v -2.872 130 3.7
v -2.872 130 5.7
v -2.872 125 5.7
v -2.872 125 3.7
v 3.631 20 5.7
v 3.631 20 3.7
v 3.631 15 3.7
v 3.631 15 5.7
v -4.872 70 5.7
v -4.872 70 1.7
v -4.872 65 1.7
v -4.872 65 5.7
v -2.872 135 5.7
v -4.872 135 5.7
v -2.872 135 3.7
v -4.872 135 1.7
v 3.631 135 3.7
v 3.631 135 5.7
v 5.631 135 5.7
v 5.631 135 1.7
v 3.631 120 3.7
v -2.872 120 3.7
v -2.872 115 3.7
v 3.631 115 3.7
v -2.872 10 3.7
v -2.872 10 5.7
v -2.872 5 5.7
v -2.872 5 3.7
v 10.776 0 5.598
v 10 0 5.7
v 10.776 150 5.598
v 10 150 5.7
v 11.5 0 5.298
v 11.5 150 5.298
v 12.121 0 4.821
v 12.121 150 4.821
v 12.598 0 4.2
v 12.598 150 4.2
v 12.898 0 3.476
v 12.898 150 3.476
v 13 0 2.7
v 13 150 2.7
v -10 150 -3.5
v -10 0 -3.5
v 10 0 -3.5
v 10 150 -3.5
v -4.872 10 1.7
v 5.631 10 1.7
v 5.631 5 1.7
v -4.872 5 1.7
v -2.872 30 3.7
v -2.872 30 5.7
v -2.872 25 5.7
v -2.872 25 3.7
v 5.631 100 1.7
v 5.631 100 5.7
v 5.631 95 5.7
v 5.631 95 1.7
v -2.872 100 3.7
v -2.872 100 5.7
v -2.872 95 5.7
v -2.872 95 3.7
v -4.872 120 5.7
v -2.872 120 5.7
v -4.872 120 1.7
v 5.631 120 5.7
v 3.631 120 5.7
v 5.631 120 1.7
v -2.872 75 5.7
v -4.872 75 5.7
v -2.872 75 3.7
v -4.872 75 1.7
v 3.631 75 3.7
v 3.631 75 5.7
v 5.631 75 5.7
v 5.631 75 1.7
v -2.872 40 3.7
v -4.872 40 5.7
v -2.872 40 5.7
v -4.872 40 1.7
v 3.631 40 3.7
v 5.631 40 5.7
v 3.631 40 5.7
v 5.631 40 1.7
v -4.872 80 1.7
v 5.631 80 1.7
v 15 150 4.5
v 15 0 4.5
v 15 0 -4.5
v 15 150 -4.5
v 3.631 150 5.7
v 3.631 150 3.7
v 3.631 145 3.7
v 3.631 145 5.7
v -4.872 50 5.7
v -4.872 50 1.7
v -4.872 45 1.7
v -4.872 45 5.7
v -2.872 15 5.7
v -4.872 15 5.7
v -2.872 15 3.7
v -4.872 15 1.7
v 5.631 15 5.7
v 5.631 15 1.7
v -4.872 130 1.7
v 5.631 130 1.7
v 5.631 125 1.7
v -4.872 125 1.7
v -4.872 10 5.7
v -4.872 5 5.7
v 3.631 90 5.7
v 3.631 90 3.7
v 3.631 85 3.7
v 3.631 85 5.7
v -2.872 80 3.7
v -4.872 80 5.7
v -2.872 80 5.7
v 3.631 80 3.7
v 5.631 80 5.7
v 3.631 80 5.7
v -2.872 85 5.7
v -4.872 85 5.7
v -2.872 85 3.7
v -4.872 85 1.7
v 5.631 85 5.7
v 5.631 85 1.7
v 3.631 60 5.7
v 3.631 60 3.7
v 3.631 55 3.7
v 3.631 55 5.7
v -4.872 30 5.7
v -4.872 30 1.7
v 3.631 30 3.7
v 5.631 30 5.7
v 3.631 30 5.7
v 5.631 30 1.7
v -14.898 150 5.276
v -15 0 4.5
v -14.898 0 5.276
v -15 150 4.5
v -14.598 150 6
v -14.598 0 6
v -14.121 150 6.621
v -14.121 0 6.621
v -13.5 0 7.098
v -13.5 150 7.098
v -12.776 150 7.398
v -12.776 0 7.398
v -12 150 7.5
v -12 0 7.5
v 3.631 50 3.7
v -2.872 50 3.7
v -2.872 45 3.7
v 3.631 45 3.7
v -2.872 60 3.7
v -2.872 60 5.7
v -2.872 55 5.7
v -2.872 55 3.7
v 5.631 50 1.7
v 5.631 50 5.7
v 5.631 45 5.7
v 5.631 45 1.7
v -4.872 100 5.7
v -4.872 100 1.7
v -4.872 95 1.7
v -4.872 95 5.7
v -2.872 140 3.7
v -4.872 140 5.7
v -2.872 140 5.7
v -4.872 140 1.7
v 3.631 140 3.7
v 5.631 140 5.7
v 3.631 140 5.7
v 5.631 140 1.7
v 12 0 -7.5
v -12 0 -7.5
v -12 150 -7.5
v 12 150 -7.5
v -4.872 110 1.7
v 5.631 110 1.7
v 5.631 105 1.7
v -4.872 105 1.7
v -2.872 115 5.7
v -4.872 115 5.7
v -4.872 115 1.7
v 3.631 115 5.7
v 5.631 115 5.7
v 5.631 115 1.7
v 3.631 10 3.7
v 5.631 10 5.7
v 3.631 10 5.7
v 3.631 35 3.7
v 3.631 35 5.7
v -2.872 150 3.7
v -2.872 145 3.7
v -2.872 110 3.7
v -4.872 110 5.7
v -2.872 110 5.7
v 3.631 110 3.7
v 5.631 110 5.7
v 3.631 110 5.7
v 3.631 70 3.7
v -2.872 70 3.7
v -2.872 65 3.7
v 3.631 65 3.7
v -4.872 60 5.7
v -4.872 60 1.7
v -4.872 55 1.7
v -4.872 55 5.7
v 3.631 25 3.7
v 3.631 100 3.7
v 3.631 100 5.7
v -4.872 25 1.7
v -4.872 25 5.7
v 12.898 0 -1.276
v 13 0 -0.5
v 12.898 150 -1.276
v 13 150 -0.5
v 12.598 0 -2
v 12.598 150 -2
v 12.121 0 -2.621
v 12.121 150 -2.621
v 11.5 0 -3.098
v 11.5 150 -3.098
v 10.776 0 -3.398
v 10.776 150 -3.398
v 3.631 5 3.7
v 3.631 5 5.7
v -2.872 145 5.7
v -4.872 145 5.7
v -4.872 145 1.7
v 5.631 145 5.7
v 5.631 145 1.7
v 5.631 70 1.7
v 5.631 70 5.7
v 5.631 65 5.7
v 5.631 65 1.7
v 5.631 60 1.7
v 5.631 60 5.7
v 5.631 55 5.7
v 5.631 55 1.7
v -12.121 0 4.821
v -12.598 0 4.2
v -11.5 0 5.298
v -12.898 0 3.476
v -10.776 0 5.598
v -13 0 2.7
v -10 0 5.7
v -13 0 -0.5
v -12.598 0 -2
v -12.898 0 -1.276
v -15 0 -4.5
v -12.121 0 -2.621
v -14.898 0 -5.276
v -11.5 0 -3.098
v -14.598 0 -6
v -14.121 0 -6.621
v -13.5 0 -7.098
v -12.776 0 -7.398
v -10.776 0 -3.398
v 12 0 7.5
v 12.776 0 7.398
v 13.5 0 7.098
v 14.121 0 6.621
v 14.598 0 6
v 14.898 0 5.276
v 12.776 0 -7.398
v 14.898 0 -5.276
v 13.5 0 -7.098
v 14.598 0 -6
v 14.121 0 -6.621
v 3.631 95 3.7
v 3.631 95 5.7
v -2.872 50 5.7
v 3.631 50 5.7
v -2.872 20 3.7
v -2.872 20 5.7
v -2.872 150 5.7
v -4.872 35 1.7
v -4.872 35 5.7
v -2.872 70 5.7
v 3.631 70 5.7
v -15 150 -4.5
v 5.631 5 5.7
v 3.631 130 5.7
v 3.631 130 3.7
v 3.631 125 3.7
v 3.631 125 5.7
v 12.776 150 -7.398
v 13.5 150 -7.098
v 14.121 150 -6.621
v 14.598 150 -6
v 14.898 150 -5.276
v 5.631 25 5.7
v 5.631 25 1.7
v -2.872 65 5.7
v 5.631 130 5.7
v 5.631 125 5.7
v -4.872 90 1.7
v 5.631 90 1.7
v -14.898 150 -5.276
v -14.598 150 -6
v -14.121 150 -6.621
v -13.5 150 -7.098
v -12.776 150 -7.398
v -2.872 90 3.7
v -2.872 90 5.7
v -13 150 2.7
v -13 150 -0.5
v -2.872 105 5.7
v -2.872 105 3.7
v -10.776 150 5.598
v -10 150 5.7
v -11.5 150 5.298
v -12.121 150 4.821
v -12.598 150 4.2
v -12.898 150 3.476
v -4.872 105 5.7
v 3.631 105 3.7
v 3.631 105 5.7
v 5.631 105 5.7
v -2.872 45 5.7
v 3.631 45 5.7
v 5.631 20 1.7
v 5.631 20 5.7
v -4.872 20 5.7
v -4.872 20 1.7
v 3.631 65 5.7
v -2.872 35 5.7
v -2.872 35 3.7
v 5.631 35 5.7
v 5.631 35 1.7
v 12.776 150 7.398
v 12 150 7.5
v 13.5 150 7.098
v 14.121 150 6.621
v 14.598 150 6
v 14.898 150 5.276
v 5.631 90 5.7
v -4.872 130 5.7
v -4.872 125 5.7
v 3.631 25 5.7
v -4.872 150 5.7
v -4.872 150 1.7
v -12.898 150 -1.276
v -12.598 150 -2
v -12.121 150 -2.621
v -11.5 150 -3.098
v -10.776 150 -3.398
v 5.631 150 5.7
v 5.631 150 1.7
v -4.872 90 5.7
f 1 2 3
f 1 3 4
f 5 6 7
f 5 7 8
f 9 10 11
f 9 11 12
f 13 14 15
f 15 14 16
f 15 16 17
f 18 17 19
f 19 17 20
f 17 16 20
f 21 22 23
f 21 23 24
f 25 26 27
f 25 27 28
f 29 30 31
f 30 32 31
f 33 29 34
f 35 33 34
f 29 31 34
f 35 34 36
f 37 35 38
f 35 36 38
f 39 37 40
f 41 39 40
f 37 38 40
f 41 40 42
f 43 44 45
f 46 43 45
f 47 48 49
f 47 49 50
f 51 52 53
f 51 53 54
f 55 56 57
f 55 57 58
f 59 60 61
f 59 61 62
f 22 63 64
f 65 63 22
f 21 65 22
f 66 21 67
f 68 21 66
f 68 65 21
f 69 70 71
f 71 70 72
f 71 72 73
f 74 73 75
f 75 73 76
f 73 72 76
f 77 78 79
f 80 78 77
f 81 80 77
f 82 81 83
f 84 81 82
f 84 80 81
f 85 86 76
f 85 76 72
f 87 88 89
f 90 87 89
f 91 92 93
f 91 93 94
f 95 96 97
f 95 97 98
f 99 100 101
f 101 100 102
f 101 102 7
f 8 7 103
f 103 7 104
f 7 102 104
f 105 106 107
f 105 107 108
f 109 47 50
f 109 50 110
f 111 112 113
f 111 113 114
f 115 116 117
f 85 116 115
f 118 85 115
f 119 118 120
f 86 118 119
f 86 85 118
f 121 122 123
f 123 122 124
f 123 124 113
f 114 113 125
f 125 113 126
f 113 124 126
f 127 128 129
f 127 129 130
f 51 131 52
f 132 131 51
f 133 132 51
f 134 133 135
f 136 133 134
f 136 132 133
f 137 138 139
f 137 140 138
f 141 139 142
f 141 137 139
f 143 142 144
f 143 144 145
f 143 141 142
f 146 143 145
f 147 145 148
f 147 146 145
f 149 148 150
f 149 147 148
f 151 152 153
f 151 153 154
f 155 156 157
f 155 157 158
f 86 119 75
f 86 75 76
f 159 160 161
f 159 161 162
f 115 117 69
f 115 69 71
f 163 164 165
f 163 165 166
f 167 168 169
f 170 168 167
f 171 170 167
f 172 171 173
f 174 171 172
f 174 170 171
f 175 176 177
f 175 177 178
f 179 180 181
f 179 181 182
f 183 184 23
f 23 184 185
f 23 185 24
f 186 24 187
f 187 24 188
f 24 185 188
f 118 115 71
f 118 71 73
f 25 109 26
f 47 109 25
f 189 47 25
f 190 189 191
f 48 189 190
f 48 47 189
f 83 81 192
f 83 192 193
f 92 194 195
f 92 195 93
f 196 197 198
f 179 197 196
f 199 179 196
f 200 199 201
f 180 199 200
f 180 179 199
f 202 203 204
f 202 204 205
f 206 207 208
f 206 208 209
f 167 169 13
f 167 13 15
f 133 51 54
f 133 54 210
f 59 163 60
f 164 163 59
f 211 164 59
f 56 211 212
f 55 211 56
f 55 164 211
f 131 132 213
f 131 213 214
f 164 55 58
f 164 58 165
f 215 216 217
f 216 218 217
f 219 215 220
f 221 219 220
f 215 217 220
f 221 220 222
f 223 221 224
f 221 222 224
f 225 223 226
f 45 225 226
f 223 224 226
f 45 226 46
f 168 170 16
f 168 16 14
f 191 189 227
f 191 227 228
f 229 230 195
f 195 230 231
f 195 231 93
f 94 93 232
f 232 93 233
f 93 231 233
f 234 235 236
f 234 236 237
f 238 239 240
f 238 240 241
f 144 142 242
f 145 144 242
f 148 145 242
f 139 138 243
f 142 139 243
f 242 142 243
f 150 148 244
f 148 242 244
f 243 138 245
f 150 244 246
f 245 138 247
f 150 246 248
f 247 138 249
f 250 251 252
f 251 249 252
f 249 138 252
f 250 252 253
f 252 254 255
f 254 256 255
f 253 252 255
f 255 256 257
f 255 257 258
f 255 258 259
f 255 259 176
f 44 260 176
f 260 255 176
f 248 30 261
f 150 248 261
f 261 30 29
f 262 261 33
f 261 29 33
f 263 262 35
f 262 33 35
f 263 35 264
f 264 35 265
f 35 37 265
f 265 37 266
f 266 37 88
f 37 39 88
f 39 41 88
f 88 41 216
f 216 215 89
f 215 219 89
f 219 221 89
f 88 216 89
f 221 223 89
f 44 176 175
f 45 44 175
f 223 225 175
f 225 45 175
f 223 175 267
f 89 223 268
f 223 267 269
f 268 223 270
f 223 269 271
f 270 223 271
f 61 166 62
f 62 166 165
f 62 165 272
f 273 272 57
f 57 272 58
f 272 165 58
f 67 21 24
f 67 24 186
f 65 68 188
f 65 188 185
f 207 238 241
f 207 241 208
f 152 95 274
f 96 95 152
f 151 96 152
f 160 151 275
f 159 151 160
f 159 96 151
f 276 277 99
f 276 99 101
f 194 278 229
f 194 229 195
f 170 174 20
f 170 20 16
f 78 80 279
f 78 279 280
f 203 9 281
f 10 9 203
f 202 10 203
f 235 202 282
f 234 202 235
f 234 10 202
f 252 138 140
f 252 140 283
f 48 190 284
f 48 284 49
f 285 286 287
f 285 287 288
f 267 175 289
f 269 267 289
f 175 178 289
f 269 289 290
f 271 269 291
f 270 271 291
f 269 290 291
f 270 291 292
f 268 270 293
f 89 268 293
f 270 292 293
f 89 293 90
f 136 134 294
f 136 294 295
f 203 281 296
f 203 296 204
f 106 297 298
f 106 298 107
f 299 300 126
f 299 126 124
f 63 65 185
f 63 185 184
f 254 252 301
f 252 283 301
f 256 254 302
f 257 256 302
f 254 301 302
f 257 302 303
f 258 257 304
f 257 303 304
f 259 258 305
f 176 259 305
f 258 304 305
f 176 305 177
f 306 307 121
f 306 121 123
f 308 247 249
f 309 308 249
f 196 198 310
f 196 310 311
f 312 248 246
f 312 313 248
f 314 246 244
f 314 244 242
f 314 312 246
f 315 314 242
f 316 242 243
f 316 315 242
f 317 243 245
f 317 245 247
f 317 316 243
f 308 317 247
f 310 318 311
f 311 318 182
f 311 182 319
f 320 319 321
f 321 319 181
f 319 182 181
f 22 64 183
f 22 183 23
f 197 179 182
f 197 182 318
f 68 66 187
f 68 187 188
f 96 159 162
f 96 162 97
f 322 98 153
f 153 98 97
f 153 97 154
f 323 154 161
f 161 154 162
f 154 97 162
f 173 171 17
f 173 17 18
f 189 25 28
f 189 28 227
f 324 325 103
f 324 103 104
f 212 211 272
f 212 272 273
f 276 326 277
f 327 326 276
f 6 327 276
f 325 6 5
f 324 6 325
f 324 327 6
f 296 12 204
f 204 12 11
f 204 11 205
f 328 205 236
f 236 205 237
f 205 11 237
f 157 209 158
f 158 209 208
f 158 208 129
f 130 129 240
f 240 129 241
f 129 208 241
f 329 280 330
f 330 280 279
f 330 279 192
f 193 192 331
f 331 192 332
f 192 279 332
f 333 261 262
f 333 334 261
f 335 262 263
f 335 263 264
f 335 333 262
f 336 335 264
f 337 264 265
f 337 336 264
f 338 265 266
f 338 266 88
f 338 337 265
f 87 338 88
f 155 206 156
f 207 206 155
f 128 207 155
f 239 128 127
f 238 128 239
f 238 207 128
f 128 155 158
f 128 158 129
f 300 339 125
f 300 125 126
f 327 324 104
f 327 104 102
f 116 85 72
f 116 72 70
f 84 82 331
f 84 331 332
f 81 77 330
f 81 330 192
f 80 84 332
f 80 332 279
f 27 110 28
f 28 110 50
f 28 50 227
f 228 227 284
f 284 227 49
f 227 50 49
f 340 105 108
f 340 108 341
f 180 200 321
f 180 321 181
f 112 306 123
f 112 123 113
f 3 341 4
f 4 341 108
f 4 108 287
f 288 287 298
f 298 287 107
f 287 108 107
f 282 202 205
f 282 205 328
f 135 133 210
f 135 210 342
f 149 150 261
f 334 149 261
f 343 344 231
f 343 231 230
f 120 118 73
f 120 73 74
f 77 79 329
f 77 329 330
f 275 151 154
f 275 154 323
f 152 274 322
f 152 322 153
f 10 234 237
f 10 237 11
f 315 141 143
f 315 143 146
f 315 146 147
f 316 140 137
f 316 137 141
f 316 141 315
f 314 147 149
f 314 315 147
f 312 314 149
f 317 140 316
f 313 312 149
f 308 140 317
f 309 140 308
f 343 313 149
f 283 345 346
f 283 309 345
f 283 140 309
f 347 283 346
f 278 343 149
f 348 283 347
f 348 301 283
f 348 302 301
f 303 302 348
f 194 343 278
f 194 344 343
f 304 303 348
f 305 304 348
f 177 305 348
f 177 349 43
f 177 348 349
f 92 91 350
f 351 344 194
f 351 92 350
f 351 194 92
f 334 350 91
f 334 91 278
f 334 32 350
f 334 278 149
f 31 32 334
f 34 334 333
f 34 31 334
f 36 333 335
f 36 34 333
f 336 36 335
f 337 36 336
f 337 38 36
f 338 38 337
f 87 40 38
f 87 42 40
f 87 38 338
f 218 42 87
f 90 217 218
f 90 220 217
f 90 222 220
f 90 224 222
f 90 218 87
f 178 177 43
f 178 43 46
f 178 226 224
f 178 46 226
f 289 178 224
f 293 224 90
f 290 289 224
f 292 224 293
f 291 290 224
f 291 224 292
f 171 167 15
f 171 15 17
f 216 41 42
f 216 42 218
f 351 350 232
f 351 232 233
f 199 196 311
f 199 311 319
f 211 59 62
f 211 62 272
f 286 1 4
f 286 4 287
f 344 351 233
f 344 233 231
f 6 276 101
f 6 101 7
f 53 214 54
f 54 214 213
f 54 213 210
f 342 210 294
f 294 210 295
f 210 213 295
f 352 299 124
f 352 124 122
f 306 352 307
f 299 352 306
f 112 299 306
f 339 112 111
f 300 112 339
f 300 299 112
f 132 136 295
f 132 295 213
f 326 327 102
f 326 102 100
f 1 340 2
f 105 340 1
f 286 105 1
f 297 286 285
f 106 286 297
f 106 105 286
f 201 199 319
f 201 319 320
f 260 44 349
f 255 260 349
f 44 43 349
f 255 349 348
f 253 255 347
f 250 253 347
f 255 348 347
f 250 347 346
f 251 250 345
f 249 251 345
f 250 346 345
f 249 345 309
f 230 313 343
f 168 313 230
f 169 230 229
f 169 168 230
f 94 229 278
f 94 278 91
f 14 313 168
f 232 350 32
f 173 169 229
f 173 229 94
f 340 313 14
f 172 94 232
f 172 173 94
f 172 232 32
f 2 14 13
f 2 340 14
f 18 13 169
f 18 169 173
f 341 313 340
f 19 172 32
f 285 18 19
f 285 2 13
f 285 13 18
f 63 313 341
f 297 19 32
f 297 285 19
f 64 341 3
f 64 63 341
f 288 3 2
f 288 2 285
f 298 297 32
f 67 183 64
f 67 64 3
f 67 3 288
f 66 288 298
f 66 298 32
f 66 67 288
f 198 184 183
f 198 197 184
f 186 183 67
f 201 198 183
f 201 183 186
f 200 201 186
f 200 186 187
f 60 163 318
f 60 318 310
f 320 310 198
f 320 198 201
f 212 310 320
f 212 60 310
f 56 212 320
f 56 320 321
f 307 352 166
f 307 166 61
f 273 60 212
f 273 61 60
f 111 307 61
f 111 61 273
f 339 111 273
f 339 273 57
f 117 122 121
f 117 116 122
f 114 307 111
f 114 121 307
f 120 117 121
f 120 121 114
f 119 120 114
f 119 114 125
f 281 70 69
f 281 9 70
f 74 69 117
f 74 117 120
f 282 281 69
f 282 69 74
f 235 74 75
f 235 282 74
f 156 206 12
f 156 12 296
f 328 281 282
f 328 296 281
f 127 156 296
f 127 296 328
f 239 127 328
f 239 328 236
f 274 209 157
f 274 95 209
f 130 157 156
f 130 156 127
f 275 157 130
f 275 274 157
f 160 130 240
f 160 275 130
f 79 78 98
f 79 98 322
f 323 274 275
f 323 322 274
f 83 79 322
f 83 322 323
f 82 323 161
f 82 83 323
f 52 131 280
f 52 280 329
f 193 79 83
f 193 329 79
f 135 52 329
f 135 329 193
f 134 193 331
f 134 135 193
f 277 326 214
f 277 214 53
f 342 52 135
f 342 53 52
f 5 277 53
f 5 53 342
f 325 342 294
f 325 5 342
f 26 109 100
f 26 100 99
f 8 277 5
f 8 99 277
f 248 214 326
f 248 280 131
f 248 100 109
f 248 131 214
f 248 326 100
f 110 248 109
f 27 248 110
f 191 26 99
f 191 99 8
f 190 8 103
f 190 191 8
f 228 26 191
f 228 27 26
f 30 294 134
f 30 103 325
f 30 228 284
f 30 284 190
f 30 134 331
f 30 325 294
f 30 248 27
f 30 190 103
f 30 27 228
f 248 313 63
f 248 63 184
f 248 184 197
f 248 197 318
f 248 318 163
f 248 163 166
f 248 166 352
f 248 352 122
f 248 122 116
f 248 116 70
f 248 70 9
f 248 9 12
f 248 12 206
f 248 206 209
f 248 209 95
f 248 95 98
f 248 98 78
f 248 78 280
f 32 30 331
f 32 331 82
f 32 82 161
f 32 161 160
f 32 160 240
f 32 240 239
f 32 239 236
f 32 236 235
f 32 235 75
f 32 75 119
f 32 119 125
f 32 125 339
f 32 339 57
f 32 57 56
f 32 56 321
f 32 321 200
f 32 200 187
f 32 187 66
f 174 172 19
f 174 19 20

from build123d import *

# Parameters (mm, degrees)
SKETCH2_W           = 30
SKETCH2_H           = 15
SKETCH2_W_2         = 26
SKETCH2_H_2         = 9.2
BOSS_EXTRUDE1_DEPTH = 150
BOSS_EXTRUDE2_DEPTH = 5
FILLET1_R           = 3
LPATTERN1_COUNT     = 15
LPATTERN1_PITCH     = 10


with BuildPart() as part:
    # Sketch2 → Boss-Extrude1 (new body)
    with BuildSketch(Plane(origin=(0, 0, 0), x_dir=(1, 0, 0), z_dir=(0, 1, 0))):
        Rectangle(SKETCH2_W, SKETCH2_H)
        with Locations((0, -1.1)):
            Rectangle(SKETCH2_W_2, SKETCH2_H_2, mode=Mode.SUBTRACT)
    extrude(amount=BOSS_EXTRUDE1_DEPTH)

    # Sketch3 → Boss-Extrude2 (add)
    with BuildSketch(Plane(origin=(0, 150, 0), x_dir=(1, 0, 0), z_dir=(0, 1, 0))):
        Polygon((-2.87163554, -5.7), (-2.87163554, -3.7), (3.631457211, -3.7), (3.631457211, -5.7), (5.631457211, -5.7), (5.631457211, -1.7), (-4.87163554, -1.7), (-4.87163554, -5.7), align=None)
    boss_extrude2 = extrude(amount=-BOSS_EXTRUDE2_DEPTH)

    # Fillet1
    fillet1_edges = [part.edges().sort_by_distance(p)[0] for p in [
        (-13, 75, -3.5),
        (-13, 75, 5.7),
        (13, 75, 5.7),
        (13, 75, -3.5),
        (-15, 75, -7.5),
        (15, 75, -7.5),
        (15, 75, 7.5),
        (-15, 75, 7.5),
    ]]
    fillet(fillet1_edges, radius=FILLET1_R)

    # LPattern1: Boss-Extrude2 ×15
    with Locations(*[(0, -i * LPATTERN1_PITCH, 0) for i in range(1, LPATTERN1_COUNT)]):
        add(boss_extrude2)


solid = part.part
